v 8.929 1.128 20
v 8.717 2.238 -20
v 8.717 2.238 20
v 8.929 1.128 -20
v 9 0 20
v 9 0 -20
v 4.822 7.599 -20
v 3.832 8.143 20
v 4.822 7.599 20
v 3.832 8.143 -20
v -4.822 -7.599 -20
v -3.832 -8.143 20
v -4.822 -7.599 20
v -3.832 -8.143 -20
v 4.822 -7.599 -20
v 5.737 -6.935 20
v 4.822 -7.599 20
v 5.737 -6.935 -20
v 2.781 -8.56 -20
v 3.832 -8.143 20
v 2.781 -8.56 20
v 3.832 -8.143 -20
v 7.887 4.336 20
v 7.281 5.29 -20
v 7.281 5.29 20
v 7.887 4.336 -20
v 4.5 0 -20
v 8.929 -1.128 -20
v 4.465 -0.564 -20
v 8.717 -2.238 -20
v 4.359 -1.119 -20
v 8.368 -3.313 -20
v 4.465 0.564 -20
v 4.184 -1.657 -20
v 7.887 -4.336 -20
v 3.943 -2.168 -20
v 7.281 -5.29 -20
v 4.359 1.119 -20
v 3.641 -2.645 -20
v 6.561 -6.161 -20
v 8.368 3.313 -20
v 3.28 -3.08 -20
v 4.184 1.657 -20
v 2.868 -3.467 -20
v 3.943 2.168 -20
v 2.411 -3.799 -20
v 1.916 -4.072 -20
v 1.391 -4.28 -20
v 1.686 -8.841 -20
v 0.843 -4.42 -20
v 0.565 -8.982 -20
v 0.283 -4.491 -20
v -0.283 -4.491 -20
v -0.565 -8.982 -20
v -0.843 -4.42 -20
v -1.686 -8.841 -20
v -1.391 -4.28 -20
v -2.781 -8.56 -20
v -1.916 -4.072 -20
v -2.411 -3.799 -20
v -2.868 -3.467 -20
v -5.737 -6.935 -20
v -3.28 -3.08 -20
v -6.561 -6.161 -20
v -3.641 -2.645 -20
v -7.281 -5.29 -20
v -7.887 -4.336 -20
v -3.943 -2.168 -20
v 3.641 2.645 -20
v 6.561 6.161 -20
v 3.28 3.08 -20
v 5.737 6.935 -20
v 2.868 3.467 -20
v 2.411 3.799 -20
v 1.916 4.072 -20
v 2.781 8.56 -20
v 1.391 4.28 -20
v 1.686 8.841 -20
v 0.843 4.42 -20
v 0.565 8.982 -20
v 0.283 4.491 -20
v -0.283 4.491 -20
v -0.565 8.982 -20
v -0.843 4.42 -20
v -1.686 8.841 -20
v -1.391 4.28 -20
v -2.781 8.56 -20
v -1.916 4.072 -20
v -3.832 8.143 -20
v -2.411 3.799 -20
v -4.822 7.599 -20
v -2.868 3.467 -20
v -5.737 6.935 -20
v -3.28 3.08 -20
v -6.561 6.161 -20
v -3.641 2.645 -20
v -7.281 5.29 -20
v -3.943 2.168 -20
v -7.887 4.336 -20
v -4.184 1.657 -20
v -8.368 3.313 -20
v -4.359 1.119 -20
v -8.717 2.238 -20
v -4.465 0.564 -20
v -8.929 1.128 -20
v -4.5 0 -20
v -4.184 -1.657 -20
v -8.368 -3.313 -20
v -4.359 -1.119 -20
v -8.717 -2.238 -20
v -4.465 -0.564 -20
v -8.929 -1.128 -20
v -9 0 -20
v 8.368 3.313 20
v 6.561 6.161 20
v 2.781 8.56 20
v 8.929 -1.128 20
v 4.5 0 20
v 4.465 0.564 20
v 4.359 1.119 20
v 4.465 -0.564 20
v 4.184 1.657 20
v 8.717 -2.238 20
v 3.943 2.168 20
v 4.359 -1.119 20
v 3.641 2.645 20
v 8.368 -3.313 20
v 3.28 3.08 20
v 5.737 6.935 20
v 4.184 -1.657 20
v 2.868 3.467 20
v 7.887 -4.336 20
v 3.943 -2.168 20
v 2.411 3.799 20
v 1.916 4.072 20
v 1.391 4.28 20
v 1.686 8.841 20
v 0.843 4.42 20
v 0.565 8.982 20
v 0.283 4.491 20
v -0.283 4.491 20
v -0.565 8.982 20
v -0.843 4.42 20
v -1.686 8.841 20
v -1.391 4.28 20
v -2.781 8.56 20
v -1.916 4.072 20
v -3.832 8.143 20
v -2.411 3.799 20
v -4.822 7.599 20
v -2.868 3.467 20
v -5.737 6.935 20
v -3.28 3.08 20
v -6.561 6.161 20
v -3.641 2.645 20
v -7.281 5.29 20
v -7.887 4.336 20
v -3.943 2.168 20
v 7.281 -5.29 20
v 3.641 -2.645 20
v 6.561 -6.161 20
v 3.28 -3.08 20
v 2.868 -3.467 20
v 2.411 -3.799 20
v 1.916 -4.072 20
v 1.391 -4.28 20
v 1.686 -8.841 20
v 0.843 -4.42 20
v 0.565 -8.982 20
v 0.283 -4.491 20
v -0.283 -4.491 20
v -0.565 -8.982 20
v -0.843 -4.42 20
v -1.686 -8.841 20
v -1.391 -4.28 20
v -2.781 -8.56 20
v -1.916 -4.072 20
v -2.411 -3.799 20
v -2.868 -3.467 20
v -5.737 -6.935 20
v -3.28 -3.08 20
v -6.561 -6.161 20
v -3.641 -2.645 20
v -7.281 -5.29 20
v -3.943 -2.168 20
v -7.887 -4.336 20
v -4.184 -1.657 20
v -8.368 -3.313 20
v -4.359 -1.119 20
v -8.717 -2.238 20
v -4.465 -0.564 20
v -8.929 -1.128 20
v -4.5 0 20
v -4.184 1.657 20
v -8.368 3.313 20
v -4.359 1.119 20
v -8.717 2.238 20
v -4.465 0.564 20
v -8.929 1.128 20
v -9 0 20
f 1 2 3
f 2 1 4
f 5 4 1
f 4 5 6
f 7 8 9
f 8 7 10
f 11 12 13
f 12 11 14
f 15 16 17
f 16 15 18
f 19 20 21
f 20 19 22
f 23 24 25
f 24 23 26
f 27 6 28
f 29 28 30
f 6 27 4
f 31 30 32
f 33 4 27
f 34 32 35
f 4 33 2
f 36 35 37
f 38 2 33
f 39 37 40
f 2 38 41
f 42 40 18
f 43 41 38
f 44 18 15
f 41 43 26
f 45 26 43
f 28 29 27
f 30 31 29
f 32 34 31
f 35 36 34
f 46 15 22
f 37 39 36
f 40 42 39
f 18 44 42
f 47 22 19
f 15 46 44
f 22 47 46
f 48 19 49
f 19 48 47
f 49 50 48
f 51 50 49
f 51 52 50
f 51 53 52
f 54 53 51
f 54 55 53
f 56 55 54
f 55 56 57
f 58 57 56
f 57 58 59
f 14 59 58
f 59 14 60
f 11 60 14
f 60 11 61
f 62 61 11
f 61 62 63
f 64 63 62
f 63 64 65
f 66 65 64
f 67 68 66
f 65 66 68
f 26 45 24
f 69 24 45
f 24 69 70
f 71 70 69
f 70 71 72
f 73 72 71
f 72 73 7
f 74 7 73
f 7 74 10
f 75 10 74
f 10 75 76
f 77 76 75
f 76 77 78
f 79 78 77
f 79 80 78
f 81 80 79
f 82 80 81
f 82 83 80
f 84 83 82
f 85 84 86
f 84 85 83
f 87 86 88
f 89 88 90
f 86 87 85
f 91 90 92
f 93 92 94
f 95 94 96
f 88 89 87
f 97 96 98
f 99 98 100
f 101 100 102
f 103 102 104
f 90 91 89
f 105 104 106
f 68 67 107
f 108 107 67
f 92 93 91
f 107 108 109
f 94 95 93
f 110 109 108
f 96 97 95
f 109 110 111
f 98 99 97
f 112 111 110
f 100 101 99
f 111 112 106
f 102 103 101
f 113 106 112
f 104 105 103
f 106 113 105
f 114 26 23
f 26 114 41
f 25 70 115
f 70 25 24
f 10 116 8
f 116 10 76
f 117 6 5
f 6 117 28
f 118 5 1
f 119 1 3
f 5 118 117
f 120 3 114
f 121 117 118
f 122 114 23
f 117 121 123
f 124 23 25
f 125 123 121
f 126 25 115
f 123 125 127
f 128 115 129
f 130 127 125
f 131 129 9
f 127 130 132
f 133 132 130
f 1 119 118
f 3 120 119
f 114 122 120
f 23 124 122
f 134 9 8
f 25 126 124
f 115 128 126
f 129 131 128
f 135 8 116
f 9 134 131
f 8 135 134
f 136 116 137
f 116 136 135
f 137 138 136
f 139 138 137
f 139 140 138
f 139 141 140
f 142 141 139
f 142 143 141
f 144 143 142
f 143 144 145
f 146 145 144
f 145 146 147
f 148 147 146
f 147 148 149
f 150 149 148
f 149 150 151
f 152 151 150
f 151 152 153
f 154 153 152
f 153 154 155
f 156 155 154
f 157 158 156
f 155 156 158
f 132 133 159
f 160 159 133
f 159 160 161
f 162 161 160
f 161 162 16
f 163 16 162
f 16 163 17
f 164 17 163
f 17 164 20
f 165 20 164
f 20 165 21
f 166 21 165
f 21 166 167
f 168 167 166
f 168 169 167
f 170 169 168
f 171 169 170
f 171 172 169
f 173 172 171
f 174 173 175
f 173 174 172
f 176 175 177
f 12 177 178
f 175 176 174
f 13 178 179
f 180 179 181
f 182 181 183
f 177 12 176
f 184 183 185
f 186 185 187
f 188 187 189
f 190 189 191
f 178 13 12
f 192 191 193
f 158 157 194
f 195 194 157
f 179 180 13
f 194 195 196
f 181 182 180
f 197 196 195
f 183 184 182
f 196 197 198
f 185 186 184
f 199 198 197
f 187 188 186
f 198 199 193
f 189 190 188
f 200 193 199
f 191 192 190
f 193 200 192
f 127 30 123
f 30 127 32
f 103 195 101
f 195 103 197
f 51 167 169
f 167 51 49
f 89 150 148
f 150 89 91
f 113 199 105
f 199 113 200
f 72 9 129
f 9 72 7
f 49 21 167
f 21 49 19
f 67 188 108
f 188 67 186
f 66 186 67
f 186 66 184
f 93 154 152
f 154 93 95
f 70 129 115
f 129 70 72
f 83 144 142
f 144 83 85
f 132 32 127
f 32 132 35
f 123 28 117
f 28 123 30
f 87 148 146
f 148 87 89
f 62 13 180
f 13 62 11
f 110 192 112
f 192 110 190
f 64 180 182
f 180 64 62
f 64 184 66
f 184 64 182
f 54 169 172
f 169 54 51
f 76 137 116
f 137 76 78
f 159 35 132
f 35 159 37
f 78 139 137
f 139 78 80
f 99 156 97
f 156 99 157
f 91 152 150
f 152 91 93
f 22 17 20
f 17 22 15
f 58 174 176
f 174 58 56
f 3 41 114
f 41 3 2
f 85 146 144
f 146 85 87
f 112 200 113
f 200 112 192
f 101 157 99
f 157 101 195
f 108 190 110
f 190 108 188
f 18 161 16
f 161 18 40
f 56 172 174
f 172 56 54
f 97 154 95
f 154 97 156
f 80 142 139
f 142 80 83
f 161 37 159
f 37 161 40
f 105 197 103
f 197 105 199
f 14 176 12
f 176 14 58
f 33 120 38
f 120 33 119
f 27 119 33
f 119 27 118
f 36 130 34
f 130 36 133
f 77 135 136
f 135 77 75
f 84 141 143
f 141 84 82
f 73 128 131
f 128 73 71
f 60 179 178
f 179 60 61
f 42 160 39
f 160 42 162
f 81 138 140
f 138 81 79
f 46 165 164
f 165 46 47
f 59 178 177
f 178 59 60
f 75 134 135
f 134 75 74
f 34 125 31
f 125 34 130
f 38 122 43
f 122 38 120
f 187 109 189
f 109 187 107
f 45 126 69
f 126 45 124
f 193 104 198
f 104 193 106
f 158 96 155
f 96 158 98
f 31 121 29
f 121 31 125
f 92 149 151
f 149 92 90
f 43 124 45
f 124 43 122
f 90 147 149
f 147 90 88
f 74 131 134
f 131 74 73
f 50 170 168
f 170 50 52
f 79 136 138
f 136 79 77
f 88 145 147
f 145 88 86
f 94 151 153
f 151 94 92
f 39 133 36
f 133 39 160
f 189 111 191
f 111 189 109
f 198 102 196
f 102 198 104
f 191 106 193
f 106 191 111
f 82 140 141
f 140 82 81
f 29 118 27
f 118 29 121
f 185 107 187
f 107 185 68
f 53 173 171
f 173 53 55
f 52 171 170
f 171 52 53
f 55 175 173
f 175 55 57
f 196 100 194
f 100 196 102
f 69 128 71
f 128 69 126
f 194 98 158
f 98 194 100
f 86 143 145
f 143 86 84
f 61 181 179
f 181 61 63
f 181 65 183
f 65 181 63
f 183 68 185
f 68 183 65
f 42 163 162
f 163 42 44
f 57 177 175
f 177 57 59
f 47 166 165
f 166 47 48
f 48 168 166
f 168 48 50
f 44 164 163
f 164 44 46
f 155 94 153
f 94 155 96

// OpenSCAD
$fn = 50;


difference() {
	union() {
		translate(v = [0, 0, -20.0000000000]) {
			cylinder(h = 40, r = 9.0000000000);
		}
	}
	union() {
		translate(v = [0, 0, -100.0000000000]) {
			cylinder(h = 200, r = 4.5000000000);
		}
	}
}
